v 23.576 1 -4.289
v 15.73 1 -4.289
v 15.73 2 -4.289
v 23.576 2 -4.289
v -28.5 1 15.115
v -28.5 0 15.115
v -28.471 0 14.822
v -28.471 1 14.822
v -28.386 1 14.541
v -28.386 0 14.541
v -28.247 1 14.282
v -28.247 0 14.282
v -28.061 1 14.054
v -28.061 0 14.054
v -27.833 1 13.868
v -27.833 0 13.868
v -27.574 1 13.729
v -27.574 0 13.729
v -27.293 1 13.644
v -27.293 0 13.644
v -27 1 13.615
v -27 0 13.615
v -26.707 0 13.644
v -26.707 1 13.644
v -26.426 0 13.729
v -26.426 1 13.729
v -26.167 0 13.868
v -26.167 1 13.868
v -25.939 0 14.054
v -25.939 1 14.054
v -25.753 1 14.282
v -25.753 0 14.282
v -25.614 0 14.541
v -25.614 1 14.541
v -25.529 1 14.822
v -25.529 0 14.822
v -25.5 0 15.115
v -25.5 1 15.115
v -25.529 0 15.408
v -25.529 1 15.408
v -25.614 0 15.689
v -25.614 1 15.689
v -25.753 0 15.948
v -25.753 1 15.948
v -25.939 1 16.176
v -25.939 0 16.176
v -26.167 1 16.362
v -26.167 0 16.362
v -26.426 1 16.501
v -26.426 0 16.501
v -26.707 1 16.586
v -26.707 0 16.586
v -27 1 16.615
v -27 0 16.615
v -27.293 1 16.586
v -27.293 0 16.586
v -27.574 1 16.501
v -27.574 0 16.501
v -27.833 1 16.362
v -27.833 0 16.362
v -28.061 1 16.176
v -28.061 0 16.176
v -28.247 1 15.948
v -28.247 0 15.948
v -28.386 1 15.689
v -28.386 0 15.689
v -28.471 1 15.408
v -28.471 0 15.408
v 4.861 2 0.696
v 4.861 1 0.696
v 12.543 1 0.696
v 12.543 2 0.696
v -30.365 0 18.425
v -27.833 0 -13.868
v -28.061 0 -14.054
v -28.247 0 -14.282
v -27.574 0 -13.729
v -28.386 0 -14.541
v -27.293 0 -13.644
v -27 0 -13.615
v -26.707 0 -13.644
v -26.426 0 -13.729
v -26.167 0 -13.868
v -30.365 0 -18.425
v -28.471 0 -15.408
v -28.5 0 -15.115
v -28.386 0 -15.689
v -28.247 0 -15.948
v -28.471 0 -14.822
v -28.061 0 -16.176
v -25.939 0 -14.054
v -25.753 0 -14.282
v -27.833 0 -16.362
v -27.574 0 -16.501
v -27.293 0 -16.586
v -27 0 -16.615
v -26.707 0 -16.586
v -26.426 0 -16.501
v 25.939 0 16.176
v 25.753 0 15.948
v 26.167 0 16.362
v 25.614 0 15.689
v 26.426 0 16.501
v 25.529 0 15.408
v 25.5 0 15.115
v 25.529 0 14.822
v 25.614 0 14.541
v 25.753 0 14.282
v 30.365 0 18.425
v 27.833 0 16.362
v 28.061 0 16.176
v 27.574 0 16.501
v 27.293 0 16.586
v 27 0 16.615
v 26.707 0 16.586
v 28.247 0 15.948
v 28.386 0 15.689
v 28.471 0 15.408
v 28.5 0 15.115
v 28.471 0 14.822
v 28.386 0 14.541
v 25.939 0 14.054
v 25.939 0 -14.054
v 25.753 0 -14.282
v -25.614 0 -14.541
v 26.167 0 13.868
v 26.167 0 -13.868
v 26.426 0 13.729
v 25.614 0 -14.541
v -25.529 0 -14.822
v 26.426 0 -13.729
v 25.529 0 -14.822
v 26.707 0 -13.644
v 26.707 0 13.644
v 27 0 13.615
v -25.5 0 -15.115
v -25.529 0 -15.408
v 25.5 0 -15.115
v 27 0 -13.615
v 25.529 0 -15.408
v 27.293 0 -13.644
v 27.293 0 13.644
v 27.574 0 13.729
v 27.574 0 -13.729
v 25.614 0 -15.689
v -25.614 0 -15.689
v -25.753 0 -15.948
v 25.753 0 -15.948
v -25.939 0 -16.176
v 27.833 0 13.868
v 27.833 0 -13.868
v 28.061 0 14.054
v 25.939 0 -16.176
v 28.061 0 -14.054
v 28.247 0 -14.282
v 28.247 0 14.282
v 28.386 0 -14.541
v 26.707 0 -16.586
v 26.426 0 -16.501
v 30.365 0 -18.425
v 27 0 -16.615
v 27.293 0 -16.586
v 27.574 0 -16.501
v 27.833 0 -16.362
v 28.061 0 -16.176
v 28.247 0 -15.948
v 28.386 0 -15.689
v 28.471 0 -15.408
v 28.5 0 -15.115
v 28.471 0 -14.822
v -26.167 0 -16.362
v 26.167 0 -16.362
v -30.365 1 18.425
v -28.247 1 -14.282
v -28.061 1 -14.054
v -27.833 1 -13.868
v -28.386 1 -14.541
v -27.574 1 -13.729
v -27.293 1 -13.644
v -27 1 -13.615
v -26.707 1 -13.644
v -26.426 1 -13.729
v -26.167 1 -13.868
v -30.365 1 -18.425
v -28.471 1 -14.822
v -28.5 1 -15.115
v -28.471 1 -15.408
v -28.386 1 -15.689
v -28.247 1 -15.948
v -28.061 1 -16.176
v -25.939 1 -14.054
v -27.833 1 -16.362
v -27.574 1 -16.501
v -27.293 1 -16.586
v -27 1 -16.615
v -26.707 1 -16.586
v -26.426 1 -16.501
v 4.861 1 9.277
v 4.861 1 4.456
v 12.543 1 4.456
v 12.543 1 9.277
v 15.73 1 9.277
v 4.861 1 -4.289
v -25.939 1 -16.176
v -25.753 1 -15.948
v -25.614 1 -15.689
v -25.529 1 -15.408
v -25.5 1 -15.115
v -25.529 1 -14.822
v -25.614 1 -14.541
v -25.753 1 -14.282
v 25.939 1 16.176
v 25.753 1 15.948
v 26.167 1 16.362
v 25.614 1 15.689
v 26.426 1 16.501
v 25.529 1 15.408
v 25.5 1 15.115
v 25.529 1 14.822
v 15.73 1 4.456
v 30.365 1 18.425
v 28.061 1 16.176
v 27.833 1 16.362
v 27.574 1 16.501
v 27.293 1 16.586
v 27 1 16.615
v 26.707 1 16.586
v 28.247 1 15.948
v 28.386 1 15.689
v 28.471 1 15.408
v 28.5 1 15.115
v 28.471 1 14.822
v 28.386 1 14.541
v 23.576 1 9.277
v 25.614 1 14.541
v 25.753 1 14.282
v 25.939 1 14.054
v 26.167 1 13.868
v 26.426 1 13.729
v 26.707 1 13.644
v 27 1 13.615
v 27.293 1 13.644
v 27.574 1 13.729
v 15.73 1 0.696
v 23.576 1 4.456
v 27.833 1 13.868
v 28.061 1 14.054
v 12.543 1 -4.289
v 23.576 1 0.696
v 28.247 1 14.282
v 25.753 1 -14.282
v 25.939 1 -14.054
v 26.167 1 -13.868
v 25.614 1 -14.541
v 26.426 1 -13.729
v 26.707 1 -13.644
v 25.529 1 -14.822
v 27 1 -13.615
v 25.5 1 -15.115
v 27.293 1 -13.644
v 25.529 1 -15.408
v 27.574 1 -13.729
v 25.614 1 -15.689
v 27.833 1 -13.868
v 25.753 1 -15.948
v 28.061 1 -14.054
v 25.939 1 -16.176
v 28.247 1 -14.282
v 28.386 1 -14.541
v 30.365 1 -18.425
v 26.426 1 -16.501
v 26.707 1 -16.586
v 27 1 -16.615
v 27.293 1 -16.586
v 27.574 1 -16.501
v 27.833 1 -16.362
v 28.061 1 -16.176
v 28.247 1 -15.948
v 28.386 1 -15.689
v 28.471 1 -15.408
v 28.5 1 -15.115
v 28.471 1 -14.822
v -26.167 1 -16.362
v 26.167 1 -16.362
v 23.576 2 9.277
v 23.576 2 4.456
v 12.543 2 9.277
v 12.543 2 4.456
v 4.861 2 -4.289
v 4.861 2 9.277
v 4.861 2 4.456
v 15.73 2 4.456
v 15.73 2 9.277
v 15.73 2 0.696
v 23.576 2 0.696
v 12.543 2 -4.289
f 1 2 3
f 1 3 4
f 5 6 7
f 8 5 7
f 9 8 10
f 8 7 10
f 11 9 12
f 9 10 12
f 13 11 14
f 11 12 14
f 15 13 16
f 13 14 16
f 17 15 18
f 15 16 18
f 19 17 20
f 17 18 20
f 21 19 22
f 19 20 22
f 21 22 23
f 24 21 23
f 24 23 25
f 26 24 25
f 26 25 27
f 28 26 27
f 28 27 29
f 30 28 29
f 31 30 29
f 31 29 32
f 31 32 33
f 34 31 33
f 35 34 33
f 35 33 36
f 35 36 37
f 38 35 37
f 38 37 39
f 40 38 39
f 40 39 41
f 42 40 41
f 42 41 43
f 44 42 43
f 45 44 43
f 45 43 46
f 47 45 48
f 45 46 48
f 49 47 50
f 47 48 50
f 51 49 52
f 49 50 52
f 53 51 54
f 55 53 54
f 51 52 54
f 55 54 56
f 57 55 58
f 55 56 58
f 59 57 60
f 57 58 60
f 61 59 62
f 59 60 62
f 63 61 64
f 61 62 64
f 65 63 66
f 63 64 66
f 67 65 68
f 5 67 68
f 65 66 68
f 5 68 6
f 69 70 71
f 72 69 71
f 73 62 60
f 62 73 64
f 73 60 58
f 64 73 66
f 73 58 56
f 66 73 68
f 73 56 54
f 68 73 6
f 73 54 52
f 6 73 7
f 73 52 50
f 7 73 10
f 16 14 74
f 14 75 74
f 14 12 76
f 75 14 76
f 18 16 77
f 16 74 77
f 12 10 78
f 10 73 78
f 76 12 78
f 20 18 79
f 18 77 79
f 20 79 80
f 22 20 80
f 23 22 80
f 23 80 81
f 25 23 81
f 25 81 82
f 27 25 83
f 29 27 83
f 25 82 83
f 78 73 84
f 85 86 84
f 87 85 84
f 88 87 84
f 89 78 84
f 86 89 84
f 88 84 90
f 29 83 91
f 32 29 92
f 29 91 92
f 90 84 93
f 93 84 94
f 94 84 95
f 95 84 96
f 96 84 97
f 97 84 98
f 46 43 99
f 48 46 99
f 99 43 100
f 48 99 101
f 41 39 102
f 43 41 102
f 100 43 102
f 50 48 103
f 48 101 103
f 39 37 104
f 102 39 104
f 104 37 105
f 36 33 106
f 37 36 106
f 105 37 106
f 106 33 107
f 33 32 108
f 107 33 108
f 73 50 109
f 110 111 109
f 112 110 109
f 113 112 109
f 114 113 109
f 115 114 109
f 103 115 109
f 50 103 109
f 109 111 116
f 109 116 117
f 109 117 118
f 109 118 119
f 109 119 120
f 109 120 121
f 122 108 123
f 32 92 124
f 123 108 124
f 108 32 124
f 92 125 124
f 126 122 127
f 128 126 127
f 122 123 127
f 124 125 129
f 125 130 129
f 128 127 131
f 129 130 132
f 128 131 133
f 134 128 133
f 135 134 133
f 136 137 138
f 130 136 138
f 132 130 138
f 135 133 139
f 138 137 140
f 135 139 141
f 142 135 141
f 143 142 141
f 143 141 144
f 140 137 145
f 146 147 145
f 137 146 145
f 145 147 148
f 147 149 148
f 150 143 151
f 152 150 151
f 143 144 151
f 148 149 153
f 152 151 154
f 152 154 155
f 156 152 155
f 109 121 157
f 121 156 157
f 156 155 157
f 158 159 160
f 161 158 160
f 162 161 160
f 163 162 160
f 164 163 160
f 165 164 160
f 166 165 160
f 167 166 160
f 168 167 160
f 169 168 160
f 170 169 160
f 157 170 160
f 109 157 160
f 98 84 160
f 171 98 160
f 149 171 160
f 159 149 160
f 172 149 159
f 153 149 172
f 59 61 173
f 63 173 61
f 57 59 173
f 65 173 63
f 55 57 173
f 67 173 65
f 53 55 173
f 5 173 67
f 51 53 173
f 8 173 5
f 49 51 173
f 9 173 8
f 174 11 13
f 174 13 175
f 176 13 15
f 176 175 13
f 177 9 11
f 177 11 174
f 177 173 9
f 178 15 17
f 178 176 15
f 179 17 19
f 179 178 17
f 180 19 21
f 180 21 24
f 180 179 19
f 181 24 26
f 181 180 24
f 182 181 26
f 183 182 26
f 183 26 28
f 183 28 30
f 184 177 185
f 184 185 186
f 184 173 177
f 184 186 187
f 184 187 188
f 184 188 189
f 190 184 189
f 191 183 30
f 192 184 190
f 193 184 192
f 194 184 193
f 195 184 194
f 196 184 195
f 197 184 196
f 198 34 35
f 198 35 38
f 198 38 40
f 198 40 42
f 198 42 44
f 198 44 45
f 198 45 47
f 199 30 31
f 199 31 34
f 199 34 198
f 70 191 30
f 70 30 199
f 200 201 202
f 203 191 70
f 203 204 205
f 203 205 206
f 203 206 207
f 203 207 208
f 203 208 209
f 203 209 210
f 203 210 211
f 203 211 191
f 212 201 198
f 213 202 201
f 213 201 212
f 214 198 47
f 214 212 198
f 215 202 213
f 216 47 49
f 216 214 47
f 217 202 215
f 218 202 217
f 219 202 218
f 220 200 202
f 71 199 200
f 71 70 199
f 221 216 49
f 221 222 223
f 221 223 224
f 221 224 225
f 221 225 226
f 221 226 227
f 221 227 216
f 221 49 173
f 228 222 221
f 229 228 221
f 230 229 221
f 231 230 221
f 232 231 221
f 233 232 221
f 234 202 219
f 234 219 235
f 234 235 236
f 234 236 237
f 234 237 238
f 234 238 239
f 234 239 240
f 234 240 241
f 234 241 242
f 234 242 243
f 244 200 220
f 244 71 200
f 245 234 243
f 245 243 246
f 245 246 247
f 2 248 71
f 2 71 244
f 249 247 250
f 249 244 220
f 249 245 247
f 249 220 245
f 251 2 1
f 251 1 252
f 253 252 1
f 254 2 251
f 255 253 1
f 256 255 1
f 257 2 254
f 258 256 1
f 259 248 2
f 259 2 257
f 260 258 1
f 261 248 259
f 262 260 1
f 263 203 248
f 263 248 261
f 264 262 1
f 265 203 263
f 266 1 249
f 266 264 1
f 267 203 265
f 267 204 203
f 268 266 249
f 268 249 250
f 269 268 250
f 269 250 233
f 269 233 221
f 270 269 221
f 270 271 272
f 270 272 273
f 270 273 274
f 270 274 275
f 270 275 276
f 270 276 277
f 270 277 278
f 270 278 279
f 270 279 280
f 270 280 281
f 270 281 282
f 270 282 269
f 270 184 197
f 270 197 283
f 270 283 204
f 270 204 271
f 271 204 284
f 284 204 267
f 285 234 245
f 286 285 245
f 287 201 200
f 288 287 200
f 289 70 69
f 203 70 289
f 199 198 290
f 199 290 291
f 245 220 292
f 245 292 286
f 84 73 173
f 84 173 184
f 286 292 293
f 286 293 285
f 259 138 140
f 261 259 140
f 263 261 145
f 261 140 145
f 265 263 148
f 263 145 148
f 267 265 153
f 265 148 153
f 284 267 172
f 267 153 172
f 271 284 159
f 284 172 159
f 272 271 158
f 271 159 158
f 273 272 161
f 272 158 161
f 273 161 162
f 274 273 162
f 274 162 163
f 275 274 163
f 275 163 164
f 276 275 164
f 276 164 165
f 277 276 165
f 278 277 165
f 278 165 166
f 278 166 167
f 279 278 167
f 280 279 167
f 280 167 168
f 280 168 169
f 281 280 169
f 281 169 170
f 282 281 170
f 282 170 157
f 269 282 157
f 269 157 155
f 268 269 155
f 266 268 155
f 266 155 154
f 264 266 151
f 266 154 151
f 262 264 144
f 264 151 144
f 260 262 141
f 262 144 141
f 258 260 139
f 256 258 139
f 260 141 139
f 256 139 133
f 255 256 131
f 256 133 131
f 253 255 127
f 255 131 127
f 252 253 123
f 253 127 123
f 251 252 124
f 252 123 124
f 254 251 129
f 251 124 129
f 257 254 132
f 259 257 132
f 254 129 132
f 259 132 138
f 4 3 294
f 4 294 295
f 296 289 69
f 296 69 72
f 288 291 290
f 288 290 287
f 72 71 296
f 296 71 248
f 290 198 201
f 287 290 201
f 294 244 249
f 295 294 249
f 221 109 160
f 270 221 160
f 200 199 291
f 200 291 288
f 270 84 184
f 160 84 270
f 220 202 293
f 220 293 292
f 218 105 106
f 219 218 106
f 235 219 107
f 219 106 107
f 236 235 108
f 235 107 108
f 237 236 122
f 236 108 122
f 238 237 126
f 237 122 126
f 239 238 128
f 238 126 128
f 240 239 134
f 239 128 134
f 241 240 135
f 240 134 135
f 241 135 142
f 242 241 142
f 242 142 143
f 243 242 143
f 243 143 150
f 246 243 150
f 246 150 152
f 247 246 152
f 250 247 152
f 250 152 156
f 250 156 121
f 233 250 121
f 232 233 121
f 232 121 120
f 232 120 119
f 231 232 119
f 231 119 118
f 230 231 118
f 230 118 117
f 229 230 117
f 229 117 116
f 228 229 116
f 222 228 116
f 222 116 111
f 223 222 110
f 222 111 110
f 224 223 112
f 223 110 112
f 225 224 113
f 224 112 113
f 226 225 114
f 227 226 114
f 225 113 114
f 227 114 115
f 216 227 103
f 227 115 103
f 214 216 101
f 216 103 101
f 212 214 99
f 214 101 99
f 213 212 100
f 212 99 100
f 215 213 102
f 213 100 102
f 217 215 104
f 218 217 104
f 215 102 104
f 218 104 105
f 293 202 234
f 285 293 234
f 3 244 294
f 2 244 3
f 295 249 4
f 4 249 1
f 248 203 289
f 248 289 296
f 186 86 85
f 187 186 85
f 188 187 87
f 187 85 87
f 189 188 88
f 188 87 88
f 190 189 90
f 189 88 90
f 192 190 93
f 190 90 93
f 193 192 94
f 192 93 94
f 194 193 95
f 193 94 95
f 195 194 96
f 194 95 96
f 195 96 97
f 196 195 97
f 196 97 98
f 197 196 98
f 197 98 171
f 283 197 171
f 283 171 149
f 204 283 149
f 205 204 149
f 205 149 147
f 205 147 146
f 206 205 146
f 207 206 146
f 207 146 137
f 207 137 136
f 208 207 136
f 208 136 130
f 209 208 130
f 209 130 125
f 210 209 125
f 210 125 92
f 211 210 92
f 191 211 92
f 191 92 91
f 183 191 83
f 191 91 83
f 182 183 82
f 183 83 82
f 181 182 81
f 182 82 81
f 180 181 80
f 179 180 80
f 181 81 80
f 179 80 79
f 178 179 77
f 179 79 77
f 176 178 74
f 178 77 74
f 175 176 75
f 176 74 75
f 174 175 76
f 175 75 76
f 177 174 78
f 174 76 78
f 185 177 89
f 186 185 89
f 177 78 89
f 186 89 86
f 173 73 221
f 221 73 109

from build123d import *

# Parameters (mm, degrees)
SKETCH_2_W                = 60.73
SKETCH_2_H                = 36.85
EXTRUDE_1_DEPTH           = 1
HOLE_WIZARD_3_0_3_1_D     = 3
HOLE_WIZARD_3_0_3_1_DEPTH = 12.4
HOLE_WIZARD_3_0_3_1_TIP   = 0.901290929
SKETCH_6_W                = 7.681831357
SKETCH_6_H                = 4.985018222
SKETCH_6_W_2              = 7.845274578
SKETCH_6_H_2              = 4.821575001
EXTRUDE_2_DEPTH           = 1


with BuildPart() as part:
    # 草图2 → 凸台-拉伸1 (new body)
    with BuildSketch(Plane(origin=(0, 0, 0), x_dir=(1, 0, 0), z_dir=(0, 1, 0))):
        Rectangle(SKETCH_2_W, SKETCH_2_H)
    extrude(amount=EXTRUDE_1_DEPTH)

    # Ø3.0 (3) 直径孔1
    with Locations(Plane(origin=(0, 1, 0), x_dir=(1, 0, 0), z_dir=(0, 1, 0))):
        with Locations((-27, 15.115), (27, 15.115), (27, -15.115), (-27, -15.115)):
            Hole(HOLE_WIZARD_3_0_3_1_D / 2, depth=HOLE_WIZARD_3_0_3_1_DEPTH)
            with Locations((0, 0, -(HOLE_WIZARD_3_0_3_1_DEPTH + HOLE_WIZARD_3_0_3_1_TIP / 2))):  # 118° drill point
                Cone(0, HOLE_WIZARD_3_0_3_1_D / 2, HOLE_WIZARD_3_0_3_1_TIP, mode=Mode.SUBTRACT)

    # 草图6 → 凸台-拉伸2 (add)
    with BuildSketch(Plane(origin=(0, 1, 0), x_dir=(1, 0, 0), z_dir=(0, 1, 0))):
        with Locations((8.702195721, 1.796125826)):
            Rectangle(SKETCH_6_W, SKETCH_6_H)
        with Locations((19.652891485, 1.796125826)):
            Rectangle(SKETCH_6_W_2, SKETCH_6_H)
        with Locations((8.702195721, -6.866364854)):
            Rectangle(SKETCH_6_W, SKETCH_6_H_2)
        with Locations((19.652891485, -6.866364854)):
            Rectangle(SKETCH_6_W_2, SKETCH_6_H_2)
    extrude(amount=EXTRUDE_2_DEPTH)


solid = part.part
